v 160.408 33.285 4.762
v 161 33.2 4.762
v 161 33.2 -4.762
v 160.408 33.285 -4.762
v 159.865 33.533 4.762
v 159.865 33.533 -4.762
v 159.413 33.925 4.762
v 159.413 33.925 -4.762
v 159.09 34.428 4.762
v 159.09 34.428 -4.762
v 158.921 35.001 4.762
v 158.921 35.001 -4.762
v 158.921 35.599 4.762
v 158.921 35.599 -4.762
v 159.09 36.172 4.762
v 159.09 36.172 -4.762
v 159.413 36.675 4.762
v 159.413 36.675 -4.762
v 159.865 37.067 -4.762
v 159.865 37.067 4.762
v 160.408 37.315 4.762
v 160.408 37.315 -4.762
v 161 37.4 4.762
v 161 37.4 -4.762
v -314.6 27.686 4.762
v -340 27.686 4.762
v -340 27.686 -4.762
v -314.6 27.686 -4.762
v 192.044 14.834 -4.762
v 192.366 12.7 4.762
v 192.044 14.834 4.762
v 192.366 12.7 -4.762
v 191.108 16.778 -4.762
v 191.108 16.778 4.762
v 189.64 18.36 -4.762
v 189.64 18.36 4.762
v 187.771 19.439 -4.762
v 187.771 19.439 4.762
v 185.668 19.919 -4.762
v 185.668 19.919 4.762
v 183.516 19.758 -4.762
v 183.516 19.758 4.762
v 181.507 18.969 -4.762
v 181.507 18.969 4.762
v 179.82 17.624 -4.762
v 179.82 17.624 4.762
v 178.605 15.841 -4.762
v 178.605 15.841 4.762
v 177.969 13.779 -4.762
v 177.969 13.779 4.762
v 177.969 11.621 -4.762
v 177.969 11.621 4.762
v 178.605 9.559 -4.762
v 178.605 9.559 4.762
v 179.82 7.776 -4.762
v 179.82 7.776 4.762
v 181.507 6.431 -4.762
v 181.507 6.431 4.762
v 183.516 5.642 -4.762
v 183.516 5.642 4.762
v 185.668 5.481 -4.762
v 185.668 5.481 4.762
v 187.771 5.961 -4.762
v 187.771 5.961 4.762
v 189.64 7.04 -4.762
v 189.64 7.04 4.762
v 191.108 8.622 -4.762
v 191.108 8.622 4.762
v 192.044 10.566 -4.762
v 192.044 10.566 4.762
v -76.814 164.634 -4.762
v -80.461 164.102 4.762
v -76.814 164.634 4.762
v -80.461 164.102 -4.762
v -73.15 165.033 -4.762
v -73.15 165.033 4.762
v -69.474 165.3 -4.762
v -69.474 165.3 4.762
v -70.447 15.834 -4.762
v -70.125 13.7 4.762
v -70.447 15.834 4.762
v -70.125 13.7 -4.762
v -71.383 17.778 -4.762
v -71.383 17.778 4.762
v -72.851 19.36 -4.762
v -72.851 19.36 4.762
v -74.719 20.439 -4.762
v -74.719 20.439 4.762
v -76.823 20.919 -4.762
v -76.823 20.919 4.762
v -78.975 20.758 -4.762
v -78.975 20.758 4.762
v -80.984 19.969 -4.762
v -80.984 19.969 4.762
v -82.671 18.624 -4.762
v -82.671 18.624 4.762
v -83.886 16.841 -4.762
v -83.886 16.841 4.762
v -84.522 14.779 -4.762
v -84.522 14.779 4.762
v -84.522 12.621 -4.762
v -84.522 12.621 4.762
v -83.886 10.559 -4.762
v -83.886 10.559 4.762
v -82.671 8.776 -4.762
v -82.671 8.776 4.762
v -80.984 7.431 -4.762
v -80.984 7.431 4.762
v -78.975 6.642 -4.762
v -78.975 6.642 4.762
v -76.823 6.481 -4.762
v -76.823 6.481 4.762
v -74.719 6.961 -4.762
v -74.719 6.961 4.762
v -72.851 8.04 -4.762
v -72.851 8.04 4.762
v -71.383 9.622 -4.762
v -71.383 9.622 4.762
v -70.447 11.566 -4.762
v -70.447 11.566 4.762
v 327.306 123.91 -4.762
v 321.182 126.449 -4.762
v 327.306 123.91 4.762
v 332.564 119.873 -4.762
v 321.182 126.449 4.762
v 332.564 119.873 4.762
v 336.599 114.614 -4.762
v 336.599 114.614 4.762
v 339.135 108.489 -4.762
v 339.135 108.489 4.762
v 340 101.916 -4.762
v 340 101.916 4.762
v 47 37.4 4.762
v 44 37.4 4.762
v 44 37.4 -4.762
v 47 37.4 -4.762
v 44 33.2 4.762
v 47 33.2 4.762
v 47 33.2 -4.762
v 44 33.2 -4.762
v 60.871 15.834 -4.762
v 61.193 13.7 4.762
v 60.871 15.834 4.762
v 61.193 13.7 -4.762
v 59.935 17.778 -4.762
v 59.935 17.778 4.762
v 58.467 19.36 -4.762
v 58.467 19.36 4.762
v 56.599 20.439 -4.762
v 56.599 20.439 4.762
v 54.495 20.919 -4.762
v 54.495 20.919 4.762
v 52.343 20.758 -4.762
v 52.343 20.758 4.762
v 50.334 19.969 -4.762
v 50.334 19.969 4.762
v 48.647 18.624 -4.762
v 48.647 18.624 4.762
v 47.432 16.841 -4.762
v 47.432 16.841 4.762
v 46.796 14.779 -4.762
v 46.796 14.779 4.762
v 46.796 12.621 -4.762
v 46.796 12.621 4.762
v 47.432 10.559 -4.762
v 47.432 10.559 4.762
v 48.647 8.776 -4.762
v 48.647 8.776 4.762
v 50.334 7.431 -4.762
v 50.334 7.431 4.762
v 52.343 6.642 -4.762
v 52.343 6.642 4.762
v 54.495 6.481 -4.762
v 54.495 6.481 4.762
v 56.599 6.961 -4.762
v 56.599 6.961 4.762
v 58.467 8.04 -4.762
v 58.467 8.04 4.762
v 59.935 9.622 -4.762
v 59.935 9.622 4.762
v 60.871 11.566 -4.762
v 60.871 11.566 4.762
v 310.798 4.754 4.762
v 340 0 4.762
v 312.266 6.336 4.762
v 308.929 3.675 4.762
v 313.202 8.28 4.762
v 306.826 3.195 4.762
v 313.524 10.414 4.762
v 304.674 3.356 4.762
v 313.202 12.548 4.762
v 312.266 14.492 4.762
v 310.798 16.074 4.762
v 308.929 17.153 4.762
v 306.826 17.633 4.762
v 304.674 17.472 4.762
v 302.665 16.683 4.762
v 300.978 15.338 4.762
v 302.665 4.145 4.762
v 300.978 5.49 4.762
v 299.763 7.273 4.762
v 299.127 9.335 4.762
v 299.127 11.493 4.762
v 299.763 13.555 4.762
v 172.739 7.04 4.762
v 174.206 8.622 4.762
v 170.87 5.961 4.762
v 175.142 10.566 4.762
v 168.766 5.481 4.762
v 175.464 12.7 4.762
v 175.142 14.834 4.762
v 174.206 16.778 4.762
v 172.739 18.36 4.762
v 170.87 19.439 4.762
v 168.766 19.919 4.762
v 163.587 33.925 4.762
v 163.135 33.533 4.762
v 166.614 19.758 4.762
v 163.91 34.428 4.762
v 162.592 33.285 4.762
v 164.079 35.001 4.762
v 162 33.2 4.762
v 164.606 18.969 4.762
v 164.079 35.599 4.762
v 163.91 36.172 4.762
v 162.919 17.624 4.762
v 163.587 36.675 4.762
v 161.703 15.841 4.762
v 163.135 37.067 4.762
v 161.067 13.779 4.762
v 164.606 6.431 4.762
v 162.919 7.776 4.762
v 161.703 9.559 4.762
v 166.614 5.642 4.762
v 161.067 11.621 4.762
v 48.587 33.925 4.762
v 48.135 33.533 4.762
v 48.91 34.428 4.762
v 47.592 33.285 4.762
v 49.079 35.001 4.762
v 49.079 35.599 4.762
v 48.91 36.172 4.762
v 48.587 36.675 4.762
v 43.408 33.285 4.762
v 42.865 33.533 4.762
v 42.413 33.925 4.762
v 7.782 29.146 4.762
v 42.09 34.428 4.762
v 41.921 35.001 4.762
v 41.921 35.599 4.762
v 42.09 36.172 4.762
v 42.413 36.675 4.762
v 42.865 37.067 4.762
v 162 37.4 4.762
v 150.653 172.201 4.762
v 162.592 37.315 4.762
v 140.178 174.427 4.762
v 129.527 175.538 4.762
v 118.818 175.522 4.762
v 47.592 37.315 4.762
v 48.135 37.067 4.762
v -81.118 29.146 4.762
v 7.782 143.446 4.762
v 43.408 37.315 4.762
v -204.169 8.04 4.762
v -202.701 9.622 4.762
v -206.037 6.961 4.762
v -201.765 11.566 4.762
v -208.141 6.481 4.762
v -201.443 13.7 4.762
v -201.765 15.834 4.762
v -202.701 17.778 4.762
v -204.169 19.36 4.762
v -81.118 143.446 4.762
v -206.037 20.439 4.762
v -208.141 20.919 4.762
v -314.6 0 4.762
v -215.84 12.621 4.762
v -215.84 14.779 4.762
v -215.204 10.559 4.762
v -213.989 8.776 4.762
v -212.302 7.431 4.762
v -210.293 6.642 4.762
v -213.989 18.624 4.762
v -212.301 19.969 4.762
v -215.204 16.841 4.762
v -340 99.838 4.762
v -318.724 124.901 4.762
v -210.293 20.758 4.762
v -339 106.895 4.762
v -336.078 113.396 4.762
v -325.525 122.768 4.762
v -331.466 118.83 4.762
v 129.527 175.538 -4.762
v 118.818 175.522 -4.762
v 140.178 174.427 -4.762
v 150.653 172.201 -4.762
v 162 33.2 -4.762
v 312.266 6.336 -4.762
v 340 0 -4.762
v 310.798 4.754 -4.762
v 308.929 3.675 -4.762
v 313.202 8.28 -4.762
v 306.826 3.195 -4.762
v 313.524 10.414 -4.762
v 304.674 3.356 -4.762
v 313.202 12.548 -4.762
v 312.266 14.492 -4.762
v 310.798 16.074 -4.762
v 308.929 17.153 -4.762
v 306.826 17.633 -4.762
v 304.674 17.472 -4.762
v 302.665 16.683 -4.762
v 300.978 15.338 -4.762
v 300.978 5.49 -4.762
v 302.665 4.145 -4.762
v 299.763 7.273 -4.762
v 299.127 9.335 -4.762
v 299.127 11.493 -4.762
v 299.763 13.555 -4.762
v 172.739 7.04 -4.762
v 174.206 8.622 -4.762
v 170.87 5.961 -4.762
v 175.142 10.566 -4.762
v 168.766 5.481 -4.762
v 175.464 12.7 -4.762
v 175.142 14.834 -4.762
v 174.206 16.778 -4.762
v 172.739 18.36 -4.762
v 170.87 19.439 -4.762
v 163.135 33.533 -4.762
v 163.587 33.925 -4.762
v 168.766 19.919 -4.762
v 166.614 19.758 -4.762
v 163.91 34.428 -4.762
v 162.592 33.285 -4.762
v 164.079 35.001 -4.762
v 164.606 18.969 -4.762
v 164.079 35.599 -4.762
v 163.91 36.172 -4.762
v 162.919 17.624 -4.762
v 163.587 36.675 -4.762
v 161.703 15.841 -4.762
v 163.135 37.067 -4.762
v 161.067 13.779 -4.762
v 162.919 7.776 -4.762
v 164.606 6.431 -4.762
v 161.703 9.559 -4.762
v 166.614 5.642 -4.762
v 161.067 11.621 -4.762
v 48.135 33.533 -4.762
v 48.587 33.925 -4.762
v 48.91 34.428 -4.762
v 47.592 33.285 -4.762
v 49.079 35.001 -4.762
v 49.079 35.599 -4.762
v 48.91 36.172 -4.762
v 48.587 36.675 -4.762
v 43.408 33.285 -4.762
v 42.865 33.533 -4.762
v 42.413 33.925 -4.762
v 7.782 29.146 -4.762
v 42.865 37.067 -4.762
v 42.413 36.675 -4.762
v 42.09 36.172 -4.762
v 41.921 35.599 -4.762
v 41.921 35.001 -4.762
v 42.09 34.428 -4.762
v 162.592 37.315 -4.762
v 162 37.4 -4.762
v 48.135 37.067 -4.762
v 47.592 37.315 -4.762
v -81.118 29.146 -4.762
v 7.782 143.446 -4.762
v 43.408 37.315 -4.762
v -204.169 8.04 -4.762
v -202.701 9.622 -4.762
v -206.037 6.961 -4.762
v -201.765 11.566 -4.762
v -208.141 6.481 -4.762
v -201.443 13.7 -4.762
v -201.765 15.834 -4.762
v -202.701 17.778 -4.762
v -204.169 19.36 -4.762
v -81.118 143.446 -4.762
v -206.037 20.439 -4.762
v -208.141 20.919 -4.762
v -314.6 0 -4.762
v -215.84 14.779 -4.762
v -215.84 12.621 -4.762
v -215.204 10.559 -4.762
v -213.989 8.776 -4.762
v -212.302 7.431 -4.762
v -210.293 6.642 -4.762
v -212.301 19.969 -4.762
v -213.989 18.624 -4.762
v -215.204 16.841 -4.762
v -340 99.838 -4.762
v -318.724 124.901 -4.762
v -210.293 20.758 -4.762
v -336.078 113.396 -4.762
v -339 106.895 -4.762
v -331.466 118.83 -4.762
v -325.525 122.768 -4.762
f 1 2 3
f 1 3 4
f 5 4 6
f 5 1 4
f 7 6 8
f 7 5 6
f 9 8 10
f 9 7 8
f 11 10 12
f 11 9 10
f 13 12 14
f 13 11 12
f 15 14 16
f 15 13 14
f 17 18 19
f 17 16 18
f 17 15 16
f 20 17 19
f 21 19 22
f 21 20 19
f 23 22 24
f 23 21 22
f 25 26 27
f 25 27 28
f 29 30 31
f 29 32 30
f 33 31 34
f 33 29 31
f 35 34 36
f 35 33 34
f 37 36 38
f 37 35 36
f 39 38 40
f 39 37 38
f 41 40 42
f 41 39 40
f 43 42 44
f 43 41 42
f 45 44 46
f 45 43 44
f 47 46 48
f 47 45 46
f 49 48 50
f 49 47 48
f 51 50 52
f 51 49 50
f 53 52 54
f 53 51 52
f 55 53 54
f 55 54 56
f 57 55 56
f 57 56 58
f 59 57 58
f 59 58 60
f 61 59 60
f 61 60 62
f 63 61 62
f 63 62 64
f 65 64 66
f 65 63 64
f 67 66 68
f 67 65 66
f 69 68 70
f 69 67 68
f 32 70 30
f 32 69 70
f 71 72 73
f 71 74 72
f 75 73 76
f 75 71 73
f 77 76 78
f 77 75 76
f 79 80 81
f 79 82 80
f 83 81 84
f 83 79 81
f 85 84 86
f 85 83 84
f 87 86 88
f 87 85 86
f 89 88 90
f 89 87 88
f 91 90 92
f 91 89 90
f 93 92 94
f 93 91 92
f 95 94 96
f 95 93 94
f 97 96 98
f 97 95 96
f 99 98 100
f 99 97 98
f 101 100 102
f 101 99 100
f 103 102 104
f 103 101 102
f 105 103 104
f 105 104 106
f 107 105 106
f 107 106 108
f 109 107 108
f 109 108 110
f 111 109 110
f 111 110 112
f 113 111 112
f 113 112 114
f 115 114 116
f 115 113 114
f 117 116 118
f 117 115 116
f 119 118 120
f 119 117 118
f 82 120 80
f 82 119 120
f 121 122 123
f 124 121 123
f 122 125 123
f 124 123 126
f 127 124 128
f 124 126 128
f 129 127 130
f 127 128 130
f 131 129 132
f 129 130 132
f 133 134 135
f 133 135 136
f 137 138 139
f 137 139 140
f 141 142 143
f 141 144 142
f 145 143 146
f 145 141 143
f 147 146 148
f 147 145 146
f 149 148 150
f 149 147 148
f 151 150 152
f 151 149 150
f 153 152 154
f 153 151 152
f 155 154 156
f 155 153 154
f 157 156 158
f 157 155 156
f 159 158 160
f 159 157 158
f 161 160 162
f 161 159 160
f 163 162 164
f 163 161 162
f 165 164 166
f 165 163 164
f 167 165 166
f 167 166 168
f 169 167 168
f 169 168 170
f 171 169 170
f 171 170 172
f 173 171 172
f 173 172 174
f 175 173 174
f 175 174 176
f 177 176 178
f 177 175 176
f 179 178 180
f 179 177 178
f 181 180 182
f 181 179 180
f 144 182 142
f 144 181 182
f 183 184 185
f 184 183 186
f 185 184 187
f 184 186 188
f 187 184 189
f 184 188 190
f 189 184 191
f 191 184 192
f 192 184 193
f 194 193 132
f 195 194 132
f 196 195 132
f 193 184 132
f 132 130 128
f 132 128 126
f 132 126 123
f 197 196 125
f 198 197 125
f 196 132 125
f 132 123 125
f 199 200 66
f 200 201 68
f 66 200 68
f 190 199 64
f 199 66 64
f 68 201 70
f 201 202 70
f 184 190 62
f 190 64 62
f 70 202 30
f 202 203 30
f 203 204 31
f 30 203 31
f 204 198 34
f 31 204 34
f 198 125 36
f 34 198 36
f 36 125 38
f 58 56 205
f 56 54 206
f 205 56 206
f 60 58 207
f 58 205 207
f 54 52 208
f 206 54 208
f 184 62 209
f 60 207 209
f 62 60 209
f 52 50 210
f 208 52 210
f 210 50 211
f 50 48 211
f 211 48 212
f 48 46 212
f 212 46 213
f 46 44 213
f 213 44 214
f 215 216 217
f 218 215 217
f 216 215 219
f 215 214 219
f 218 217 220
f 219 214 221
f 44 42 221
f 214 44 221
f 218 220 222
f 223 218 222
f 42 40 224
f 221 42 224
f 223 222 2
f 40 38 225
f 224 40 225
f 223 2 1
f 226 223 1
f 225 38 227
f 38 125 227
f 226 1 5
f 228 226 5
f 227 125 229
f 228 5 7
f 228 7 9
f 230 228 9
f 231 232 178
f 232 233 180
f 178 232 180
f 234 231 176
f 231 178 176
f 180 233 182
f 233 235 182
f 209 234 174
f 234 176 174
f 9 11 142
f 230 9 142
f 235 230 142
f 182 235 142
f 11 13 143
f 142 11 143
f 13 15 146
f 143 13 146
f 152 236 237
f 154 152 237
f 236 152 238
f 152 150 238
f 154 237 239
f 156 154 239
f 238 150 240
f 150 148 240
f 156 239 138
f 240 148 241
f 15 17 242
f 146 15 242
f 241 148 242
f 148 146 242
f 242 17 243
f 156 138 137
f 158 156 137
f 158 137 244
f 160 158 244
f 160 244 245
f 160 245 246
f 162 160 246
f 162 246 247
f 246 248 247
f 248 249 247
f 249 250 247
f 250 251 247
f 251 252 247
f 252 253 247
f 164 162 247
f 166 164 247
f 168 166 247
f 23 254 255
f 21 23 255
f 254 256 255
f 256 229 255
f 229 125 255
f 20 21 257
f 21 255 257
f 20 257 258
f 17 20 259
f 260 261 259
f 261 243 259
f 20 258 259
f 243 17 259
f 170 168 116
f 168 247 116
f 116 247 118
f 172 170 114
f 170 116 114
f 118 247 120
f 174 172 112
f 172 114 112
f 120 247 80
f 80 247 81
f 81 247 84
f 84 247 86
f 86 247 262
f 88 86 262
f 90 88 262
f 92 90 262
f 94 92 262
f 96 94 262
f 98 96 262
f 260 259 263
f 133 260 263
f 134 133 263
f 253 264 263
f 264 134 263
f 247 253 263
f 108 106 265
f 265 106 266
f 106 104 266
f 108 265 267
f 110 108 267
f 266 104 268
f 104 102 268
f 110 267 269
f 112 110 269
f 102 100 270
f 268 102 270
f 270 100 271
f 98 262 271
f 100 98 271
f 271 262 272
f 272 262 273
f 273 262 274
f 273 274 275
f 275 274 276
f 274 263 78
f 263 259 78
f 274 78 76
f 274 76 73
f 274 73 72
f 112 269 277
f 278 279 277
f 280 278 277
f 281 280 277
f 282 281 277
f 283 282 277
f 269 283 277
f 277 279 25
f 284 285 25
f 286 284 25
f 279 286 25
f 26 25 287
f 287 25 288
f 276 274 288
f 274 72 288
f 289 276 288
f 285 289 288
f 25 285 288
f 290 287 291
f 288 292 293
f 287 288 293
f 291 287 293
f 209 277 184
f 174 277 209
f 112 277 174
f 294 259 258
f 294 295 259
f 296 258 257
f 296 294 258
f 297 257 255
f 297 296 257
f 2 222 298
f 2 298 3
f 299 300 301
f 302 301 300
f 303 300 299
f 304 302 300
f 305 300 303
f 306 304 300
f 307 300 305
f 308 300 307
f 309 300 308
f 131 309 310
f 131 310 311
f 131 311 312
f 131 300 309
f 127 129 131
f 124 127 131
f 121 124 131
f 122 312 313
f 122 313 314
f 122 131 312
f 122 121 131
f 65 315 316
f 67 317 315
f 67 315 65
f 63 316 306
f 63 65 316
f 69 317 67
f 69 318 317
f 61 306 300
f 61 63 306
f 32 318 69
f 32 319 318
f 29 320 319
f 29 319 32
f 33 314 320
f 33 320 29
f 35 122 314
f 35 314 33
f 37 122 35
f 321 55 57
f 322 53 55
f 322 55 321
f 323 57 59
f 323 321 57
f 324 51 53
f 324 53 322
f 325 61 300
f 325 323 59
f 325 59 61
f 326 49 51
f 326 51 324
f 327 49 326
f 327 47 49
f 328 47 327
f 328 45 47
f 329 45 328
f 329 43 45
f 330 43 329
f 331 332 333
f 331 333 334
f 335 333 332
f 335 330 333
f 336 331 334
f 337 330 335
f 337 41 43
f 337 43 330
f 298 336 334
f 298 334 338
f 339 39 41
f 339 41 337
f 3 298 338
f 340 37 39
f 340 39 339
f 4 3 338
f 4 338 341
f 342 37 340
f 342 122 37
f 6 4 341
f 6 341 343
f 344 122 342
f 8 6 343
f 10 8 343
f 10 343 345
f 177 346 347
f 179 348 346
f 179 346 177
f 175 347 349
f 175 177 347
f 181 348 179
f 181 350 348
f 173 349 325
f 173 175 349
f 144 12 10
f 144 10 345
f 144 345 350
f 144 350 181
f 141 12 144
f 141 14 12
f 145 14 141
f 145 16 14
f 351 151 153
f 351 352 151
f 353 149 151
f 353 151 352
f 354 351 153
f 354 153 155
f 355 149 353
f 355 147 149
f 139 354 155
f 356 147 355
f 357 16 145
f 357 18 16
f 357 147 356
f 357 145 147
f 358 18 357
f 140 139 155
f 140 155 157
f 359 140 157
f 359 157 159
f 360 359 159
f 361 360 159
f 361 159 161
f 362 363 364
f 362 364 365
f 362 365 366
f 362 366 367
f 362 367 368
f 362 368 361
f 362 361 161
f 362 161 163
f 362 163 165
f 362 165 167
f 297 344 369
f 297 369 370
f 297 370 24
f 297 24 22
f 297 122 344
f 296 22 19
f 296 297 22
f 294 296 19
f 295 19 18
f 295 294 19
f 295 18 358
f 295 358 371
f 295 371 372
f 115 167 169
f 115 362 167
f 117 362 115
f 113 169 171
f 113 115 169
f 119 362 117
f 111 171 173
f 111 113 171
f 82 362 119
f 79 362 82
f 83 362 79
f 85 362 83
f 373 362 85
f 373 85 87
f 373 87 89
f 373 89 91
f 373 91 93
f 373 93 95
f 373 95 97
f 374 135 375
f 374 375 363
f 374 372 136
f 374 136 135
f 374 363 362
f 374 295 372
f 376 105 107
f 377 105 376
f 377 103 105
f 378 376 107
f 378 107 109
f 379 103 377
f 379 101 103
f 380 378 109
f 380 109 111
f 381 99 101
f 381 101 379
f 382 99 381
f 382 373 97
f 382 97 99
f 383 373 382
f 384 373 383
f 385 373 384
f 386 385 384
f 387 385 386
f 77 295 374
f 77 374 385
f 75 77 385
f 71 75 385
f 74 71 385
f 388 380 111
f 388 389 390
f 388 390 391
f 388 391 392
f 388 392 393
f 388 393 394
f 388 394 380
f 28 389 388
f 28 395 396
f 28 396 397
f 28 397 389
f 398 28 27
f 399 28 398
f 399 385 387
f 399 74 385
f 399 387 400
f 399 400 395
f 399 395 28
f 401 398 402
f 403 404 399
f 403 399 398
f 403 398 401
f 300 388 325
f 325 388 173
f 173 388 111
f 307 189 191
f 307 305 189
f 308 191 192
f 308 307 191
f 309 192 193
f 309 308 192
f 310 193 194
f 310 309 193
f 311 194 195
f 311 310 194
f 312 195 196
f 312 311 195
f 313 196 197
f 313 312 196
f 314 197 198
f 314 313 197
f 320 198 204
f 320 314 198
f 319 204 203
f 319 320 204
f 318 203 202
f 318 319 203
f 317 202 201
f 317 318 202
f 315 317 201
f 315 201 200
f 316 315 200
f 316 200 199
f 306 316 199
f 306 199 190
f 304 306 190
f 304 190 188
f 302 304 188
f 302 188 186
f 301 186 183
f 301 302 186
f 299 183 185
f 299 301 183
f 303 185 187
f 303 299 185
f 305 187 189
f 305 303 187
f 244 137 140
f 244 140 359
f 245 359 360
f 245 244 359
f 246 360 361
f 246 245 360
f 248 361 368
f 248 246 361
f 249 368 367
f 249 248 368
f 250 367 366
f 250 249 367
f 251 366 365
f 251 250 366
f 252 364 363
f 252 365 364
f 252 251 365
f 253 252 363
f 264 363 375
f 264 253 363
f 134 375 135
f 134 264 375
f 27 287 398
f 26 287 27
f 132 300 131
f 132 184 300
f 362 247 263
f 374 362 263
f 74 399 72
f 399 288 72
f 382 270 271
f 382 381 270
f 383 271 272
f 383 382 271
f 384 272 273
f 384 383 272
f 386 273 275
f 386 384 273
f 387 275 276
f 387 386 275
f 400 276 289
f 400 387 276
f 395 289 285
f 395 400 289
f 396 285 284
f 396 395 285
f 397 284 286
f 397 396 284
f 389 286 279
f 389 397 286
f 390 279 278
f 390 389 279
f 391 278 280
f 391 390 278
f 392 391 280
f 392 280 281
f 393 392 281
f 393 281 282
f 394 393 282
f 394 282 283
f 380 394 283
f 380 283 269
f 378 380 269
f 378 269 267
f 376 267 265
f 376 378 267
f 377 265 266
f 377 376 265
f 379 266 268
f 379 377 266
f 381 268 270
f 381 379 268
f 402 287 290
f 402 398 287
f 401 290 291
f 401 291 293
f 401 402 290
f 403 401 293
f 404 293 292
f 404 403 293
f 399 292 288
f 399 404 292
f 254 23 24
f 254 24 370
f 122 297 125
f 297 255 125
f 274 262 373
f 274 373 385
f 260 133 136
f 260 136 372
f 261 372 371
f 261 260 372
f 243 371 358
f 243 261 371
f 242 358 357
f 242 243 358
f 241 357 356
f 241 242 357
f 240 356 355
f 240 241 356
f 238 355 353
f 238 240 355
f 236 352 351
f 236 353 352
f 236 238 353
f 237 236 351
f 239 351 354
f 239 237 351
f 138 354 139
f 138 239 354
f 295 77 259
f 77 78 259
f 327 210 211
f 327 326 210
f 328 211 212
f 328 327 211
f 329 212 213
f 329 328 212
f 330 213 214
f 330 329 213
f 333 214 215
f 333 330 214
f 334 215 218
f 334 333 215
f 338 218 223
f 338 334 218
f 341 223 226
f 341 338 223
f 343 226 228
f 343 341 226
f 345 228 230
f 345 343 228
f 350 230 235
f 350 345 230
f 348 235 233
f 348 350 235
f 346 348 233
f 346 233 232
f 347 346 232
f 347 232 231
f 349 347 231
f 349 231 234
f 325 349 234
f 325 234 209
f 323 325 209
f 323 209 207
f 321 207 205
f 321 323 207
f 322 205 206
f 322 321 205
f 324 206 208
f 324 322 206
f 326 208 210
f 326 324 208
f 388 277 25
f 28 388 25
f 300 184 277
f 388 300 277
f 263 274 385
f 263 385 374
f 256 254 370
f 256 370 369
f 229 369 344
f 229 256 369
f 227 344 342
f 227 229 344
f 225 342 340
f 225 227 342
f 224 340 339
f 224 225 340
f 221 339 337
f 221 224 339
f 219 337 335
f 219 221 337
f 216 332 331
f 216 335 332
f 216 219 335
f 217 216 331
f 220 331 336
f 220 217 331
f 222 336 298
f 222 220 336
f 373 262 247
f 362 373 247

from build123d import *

# Parameters (mm, degrees)
SKETCH2_R           = 7.239
BOSS_EXTRUDE1_DEPTH = 4.7625
FILLET1_R           = 25.4
FILLET2_R           = 101.6
SKETCH3_W           = 25.4
SKETCH3_H           = 27.686
CUT_EXTRUDE1_DEPTH  = 10.525
SKETCH5_W           = 88.9
SKETCH5_H           = 114.3
CUT_EXTRUDE2_DEPTH  = 10.525
CUT_EXTRUDE3_DEPTH  = 10.525


with BuildPart() as part:
    # Sketch2 → Boss-Extrude1 (new body, symmetric)
    with BuildSketch(Plane.XY):
        Polygon((-340, 26.400000032), (-340, 121.400000032), (-75, 165), (135, 176.400000032), (340, 121.400000032), (340, 26.400000032), (340, 0), (-340, 0), align=None)
        with Locations((-208.682, 13.700000032)):
            Circle(SKETCH2_R, mode=Mode.SUBTRACT)
        with Locations((-77.364, 13.700000032)):
            Circle(SKETCH2_R, mode=Mode.SUBTRACT)
        with Locations((53.954, 13.700000032)):
            Circle(SKETCH2_R, mode=Mode.SUBTRACT)
        with Locations((185.126699107, 12.7)):
            Circle(SKETCH2_R, mode=Mode.SUBTRACT)
        with Locations((306.284699107, 10.414)):
            Circle(SKETCH2_R, mode=Mode.SUBTRACT)
        with Locations((168.225103232, 12.7)):
            Circle(SKETCH2_R, mode=Mode.SUBTRACT)
    extrude(amount=BOSS_EXTRUDE1_DEPTH, both=True)

    # Fillet1
    fillet1_edges = [part.edges().sort_by_distance(p)[0] for p in [
        (-340, 121.400000032, 0),
        (340, 121.400000032, 0),
    ]]
    fillet(fillet1_edges, radius=FILLET1_R)

    # Fillet2
    fillet2_edges = [part.edges().sort_by_distance(p)[0] for p in [
        (-75, 165, 0),
        (135, 176.400000032, 0),
    ]]
    fillet(fillet2_edges, radius=FILLET2_R)

    # Sketch3 → Cut-Extrude1 (cut, through all)
    with BuildSketch(Plane.XY.offset(4.7625)):
        with Locations((-327.3, 13.843)):
            Rectangle(SKETCH3_W, SKETCH3_H)
    extrude(amount=-CUT_EXTRUDE1_DEPTH, mode=Mode.SUBTRACT)

    # Sketch5 → Cut-Extrude2 (cut, through all)
    with BuildSketch(Plane.XY.offset(4.7625)):
        with Locations((-36.66848567, 86.296499999)):
            Rectangle(SKETCH5_W, SKETCH5_H)
    extrude(amount=-CUT_EXTRUDE2_DEPTH, mode=Mode.SUBTRACT)

    # Sketch8 → Cut-Extrude3 (cut, through all)
    with BuildSketch(Plane.XY.offset(4.7625)):
        with BuildLine():
            Line((161, 37.4), (162, 37.4))
            ThreePointArc((162, 37.4), (164.1, 35.3), (162, 33.2))
            Line((162, 33.2), (161, 33.2))
            ThreePointArc((161, 33.2), (158.9, 35.3), (161, 37.4))
        make_face()
        with BuildLine():
            Line((47, 33.2), (44, 33.2))
            ThreePointArc((44, 33.2), (41.9, 35.3), (44, 37.4))
            Line((44, 37.4), (47, 37.4))
            ThreePointArc((47, 37.4), (49.1, 35.3), (47, 33.2))
        make_face()
    extrude(amount=-CUT_EXTRUDE3_DEPTH, mode=Mode.SUBTRACT)


solid = part.part
